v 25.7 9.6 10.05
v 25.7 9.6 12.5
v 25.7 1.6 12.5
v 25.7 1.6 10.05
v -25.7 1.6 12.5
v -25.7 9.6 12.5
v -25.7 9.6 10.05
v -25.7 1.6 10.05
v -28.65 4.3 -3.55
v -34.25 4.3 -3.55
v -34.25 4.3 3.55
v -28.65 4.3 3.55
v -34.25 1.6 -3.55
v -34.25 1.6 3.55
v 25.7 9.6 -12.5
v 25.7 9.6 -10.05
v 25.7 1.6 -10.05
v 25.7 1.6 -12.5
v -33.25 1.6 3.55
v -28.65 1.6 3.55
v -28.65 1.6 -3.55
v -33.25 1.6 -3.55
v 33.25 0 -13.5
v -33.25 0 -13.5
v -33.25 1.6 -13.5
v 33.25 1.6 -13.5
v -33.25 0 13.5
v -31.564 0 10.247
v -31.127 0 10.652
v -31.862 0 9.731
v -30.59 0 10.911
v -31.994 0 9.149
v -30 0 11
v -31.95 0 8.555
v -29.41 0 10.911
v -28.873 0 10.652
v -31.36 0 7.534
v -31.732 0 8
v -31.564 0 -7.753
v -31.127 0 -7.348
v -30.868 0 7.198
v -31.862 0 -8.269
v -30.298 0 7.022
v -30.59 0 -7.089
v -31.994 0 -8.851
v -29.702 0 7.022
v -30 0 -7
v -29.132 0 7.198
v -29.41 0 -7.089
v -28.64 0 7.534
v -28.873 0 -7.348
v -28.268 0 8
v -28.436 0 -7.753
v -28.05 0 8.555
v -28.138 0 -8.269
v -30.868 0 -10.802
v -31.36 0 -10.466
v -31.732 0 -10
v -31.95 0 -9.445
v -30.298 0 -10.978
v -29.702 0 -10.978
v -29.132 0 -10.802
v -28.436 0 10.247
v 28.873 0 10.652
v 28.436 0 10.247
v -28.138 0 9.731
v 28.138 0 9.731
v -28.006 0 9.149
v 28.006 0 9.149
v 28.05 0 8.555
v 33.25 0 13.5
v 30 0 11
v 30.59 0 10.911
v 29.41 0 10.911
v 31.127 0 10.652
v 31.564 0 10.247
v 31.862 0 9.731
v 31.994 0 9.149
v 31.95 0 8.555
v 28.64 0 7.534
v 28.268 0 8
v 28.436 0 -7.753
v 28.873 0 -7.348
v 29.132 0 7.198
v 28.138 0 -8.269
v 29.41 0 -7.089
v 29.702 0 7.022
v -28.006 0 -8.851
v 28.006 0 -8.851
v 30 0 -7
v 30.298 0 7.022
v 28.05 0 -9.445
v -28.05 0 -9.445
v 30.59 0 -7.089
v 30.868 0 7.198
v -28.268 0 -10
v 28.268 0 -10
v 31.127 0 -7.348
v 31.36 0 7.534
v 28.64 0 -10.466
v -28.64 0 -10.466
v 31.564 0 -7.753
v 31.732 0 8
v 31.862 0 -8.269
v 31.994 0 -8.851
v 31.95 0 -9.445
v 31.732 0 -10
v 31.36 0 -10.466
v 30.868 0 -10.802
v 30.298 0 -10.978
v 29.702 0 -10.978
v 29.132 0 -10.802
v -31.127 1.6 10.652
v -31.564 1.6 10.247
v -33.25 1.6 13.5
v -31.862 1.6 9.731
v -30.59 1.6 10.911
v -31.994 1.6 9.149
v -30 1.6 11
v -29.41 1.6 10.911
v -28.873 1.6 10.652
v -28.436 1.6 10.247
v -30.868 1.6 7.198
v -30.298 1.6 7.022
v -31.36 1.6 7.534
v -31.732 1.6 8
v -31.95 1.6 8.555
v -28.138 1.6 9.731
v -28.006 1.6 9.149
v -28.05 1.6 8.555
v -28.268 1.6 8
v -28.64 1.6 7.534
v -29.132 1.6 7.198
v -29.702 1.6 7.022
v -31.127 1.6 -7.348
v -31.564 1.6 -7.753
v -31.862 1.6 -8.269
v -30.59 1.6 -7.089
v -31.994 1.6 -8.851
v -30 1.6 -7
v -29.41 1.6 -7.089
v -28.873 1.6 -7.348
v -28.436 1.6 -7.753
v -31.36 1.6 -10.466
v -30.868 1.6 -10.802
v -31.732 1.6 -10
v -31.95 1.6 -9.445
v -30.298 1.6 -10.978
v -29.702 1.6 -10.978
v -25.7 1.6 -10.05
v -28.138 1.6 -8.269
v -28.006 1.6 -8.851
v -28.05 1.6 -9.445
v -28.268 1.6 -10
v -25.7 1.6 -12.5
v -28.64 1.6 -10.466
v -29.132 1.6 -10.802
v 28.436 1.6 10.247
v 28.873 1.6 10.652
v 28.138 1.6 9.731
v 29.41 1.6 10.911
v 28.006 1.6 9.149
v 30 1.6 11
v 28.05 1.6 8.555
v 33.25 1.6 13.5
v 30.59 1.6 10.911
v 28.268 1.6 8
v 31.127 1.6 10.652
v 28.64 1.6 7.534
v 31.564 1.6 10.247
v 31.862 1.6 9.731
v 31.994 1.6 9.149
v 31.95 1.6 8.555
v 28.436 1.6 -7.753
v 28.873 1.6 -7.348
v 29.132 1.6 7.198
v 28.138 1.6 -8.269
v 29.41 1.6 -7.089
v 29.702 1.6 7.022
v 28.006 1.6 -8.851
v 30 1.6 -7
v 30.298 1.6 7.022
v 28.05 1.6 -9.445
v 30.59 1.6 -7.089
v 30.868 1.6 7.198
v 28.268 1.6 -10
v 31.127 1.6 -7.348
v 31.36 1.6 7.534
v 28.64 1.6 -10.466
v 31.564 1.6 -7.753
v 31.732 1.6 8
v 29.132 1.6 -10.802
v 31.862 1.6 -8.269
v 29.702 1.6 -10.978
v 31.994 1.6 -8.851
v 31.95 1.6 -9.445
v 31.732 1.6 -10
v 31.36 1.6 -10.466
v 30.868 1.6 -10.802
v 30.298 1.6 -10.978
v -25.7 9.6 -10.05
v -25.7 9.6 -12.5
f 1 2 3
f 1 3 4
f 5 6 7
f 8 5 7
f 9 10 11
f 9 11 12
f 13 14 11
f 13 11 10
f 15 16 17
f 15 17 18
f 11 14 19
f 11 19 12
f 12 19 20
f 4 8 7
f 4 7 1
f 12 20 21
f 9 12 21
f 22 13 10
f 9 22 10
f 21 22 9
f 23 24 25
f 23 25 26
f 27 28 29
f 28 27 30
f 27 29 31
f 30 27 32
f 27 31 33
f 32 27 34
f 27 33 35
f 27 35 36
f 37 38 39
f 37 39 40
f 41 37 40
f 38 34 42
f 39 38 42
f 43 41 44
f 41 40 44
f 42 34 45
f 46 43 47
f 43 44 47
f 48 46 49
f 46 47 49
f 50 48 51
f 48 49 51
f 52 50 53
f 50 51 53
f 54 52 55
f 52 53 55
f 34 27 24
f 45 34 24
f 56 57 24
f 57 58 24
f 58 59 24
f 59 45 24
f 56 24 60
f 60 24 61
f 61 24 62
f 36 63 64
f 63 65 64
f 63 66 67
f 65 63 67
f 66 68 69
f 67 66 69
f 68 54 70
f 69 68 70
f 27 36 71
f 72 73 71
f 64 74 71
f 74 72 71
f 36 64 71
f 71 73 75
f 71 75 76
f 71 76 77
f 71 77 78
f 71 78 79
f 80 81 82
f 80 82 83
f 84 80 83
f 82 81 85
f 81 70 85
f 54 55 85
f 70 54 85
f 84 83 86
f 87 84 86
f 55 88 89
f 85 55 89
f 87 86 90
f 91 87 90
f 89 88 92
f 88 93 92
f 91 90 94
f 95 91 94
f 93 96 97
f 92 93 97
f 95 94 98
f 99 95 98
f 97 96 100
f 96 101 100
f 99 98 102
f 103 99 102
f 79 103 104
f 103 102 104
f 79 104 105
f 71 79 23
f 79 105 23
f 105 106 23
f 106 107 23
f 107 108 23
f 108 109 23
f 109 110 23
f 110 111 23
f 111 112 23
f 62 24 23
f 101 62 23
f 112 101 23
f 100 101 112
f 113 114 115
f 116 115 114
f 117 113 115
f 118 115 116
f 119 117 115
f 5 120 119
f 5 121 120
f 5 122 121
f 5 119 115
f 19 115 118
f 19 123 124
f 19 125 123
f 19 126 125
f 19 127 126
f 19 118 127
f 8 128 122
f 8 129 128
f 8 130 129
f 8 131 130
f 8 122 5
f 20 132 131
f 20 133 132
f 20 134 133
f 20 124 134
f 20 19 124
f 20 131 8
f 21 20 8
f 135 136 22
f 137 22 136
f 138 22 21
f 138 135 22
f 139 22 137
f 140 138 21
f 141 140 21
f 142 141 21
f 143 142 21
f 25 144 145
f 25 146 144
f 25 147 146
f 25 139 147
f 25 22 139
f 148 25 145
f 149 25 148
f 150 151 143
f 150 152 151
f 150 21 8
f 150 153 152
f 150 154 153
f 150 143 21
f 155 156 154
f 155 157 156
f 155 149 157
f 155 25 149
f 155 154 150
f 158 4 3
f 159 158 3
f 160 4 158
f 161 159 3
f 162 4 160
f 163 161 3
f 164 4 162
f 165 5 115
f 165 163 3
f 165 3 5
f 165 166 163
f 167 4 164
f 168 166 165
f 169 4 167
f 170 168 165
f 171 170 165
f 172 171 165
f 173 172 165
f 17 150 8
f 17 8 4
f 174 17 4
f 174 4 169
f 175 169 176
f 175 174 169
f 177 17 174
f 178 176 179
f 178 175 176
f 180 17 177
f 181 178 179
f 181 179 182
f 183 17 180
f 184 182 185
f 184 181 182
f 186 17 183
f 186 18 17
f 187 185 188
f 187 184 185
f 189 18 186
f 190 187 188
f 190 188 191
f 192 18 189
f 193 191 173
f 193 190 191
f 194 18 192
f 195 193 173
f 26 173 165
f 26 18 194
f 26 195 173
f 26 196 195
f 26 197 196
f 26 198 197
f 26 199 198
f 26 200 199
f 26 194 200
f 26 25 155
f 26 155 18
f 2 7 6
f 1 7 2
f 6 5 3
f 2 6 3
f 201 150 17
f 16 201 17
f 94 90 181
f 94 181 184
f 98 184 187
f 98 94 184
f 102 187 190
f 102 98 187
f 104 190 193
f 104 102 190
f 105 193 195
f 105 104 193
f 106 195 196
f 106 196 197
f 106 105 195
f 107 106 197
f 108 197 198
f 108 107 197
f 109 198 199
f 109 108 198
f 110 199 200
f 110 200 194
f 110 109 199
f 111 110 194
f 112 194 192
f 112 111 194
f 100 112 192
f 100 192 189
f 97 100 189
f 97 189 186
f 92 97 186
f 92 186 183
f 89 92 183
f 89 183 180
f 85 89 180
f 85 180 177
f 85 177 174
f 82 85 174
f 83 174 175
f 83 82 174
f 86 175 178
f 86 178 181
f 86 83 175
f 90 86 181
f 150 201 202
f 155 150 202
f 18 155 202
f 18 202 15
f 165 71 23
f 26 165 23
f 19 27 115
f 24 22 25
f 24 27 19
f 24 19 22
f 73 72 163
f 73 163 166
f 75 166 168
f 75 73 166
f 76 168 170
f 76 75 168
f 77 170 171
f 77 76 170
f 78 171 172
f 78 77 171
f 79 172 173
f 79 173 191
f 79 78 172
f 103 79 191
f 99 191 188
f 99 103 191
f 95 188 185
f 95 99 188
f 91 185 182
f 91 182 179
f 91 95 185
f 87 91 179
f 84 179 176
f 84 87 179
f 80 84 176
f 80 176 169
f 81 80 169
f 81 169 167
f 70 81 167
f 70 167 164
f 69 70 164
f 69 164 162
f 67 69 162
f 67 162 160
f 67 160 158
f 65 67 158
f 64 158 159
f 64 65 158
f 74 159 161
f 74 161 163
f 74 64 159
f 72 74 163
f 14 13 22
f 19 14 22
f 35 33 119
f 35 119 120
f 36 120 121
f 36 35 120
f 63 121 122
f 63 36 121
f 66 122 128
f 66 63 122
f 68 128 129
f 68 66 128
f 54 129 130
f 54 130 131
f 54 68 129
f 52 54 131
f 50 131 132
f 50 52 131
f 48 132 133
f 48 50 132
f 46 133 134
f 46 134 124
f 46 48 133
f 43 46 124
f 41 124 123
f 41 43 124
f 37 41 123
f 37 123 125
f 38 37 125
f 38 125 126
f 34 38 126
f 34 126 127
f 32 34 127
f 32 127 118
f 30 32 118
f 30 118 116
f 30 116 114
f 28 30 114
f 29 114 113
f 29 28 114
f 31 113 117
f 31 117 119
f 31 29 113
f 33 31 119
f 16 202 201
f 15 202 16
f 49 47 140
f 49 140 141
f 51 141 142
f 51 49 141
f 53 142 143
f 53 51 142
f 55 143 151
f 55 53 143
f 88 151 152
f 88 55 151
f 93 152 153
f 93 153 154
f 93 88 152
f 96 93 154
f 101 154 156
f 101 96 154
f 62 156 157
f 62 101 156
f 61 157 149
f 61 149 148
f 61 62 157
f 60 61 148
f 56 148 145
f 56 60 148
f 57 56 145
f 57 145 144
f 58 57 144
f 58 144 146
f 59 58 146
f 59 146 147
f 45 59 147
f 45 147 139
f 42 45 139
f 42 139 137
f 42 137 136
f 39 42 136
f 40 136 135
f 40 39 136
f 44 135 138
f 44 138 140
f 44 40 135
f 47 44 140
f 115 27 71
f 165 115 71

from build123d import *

# Parameters (mm, degrees)
SKETCH1_W           = 66.5
SKETCH1_H           = 27
SKETCH1_R           = 2
BOSS_EXTRUDE1_DEPTH = 1.6
SKETCH2_W           = 5.6
SKETCH2_H           = 7.1
BOSS_EXTRUDE2_DEPTH = 2.7
SKETCH3_W           = 51.4
SKETCH3_H           = 2.45
BOSS_EXTRUDE3_DEPTH = 8


with BuildPart() as part:
    # Sketch1 → Boss-Extrude1 (new body)
    with BuildSketch(Plane(origin=(0, 0, 0), x_dir=(1, 0, 0), z_dir=(0, 1, 0))):
        Rectangle(SKETCH1_W, SKETCH1_H)
        with Locations(Location((-30, 9, 0), (0, 0, 270))):
            Circle(SKETCH1_R, mode=Mode.SUBTRACT)
        with Locations(Location((-30, -9, 0), (0, 0, 270))):
            Circle(SKETCH1_R, mode=Mode.SUBTRACT)
        with Locations(Location((30, -9, 0), (0, 0, 270))):
            Circle(SKETCH1_R, mode=Mode.SUBTRACT)
        with Locations(Location((30, 9, 0), (0, 0, 270))):
            Circle(SKETCH1_R, mode=Mode.SUBTRACT)
    extrude(amount=BOSS_EXTRUDE1_DEPTH)

    # Sketch2 → Boss-Extrude2 (add)
    with BuildSketch(Plane(origin=(0, 1.6, 0), x_dir=(1, 0, 0), z_dir=(0, 1, 0))):
        with Locations((-31.45, 0)):
            Rectangle(SKETCH2_W, SKETCH2_H)
    extrude(amount=BOSS_EXTRUDE2_DEPTH)

    # Sketch3 → Boss-Extrude3 (add)
    with BuildSketch(Plane(origin=(0, 1.6, 0), x_dir=(1, 0, 0), z_dir=(0, 1, 0))):
        with Locations((0, 11.275)):
            Rectangle(SKETCH3_W, SKETCH3_H)
        with Locations((0, -11.275)):
            Rectangle(SKETCH3_W, SKETCH3_H)
    extrude(amount=BOSS_EXTRUDE3_DEPTH)


solid = part.part
